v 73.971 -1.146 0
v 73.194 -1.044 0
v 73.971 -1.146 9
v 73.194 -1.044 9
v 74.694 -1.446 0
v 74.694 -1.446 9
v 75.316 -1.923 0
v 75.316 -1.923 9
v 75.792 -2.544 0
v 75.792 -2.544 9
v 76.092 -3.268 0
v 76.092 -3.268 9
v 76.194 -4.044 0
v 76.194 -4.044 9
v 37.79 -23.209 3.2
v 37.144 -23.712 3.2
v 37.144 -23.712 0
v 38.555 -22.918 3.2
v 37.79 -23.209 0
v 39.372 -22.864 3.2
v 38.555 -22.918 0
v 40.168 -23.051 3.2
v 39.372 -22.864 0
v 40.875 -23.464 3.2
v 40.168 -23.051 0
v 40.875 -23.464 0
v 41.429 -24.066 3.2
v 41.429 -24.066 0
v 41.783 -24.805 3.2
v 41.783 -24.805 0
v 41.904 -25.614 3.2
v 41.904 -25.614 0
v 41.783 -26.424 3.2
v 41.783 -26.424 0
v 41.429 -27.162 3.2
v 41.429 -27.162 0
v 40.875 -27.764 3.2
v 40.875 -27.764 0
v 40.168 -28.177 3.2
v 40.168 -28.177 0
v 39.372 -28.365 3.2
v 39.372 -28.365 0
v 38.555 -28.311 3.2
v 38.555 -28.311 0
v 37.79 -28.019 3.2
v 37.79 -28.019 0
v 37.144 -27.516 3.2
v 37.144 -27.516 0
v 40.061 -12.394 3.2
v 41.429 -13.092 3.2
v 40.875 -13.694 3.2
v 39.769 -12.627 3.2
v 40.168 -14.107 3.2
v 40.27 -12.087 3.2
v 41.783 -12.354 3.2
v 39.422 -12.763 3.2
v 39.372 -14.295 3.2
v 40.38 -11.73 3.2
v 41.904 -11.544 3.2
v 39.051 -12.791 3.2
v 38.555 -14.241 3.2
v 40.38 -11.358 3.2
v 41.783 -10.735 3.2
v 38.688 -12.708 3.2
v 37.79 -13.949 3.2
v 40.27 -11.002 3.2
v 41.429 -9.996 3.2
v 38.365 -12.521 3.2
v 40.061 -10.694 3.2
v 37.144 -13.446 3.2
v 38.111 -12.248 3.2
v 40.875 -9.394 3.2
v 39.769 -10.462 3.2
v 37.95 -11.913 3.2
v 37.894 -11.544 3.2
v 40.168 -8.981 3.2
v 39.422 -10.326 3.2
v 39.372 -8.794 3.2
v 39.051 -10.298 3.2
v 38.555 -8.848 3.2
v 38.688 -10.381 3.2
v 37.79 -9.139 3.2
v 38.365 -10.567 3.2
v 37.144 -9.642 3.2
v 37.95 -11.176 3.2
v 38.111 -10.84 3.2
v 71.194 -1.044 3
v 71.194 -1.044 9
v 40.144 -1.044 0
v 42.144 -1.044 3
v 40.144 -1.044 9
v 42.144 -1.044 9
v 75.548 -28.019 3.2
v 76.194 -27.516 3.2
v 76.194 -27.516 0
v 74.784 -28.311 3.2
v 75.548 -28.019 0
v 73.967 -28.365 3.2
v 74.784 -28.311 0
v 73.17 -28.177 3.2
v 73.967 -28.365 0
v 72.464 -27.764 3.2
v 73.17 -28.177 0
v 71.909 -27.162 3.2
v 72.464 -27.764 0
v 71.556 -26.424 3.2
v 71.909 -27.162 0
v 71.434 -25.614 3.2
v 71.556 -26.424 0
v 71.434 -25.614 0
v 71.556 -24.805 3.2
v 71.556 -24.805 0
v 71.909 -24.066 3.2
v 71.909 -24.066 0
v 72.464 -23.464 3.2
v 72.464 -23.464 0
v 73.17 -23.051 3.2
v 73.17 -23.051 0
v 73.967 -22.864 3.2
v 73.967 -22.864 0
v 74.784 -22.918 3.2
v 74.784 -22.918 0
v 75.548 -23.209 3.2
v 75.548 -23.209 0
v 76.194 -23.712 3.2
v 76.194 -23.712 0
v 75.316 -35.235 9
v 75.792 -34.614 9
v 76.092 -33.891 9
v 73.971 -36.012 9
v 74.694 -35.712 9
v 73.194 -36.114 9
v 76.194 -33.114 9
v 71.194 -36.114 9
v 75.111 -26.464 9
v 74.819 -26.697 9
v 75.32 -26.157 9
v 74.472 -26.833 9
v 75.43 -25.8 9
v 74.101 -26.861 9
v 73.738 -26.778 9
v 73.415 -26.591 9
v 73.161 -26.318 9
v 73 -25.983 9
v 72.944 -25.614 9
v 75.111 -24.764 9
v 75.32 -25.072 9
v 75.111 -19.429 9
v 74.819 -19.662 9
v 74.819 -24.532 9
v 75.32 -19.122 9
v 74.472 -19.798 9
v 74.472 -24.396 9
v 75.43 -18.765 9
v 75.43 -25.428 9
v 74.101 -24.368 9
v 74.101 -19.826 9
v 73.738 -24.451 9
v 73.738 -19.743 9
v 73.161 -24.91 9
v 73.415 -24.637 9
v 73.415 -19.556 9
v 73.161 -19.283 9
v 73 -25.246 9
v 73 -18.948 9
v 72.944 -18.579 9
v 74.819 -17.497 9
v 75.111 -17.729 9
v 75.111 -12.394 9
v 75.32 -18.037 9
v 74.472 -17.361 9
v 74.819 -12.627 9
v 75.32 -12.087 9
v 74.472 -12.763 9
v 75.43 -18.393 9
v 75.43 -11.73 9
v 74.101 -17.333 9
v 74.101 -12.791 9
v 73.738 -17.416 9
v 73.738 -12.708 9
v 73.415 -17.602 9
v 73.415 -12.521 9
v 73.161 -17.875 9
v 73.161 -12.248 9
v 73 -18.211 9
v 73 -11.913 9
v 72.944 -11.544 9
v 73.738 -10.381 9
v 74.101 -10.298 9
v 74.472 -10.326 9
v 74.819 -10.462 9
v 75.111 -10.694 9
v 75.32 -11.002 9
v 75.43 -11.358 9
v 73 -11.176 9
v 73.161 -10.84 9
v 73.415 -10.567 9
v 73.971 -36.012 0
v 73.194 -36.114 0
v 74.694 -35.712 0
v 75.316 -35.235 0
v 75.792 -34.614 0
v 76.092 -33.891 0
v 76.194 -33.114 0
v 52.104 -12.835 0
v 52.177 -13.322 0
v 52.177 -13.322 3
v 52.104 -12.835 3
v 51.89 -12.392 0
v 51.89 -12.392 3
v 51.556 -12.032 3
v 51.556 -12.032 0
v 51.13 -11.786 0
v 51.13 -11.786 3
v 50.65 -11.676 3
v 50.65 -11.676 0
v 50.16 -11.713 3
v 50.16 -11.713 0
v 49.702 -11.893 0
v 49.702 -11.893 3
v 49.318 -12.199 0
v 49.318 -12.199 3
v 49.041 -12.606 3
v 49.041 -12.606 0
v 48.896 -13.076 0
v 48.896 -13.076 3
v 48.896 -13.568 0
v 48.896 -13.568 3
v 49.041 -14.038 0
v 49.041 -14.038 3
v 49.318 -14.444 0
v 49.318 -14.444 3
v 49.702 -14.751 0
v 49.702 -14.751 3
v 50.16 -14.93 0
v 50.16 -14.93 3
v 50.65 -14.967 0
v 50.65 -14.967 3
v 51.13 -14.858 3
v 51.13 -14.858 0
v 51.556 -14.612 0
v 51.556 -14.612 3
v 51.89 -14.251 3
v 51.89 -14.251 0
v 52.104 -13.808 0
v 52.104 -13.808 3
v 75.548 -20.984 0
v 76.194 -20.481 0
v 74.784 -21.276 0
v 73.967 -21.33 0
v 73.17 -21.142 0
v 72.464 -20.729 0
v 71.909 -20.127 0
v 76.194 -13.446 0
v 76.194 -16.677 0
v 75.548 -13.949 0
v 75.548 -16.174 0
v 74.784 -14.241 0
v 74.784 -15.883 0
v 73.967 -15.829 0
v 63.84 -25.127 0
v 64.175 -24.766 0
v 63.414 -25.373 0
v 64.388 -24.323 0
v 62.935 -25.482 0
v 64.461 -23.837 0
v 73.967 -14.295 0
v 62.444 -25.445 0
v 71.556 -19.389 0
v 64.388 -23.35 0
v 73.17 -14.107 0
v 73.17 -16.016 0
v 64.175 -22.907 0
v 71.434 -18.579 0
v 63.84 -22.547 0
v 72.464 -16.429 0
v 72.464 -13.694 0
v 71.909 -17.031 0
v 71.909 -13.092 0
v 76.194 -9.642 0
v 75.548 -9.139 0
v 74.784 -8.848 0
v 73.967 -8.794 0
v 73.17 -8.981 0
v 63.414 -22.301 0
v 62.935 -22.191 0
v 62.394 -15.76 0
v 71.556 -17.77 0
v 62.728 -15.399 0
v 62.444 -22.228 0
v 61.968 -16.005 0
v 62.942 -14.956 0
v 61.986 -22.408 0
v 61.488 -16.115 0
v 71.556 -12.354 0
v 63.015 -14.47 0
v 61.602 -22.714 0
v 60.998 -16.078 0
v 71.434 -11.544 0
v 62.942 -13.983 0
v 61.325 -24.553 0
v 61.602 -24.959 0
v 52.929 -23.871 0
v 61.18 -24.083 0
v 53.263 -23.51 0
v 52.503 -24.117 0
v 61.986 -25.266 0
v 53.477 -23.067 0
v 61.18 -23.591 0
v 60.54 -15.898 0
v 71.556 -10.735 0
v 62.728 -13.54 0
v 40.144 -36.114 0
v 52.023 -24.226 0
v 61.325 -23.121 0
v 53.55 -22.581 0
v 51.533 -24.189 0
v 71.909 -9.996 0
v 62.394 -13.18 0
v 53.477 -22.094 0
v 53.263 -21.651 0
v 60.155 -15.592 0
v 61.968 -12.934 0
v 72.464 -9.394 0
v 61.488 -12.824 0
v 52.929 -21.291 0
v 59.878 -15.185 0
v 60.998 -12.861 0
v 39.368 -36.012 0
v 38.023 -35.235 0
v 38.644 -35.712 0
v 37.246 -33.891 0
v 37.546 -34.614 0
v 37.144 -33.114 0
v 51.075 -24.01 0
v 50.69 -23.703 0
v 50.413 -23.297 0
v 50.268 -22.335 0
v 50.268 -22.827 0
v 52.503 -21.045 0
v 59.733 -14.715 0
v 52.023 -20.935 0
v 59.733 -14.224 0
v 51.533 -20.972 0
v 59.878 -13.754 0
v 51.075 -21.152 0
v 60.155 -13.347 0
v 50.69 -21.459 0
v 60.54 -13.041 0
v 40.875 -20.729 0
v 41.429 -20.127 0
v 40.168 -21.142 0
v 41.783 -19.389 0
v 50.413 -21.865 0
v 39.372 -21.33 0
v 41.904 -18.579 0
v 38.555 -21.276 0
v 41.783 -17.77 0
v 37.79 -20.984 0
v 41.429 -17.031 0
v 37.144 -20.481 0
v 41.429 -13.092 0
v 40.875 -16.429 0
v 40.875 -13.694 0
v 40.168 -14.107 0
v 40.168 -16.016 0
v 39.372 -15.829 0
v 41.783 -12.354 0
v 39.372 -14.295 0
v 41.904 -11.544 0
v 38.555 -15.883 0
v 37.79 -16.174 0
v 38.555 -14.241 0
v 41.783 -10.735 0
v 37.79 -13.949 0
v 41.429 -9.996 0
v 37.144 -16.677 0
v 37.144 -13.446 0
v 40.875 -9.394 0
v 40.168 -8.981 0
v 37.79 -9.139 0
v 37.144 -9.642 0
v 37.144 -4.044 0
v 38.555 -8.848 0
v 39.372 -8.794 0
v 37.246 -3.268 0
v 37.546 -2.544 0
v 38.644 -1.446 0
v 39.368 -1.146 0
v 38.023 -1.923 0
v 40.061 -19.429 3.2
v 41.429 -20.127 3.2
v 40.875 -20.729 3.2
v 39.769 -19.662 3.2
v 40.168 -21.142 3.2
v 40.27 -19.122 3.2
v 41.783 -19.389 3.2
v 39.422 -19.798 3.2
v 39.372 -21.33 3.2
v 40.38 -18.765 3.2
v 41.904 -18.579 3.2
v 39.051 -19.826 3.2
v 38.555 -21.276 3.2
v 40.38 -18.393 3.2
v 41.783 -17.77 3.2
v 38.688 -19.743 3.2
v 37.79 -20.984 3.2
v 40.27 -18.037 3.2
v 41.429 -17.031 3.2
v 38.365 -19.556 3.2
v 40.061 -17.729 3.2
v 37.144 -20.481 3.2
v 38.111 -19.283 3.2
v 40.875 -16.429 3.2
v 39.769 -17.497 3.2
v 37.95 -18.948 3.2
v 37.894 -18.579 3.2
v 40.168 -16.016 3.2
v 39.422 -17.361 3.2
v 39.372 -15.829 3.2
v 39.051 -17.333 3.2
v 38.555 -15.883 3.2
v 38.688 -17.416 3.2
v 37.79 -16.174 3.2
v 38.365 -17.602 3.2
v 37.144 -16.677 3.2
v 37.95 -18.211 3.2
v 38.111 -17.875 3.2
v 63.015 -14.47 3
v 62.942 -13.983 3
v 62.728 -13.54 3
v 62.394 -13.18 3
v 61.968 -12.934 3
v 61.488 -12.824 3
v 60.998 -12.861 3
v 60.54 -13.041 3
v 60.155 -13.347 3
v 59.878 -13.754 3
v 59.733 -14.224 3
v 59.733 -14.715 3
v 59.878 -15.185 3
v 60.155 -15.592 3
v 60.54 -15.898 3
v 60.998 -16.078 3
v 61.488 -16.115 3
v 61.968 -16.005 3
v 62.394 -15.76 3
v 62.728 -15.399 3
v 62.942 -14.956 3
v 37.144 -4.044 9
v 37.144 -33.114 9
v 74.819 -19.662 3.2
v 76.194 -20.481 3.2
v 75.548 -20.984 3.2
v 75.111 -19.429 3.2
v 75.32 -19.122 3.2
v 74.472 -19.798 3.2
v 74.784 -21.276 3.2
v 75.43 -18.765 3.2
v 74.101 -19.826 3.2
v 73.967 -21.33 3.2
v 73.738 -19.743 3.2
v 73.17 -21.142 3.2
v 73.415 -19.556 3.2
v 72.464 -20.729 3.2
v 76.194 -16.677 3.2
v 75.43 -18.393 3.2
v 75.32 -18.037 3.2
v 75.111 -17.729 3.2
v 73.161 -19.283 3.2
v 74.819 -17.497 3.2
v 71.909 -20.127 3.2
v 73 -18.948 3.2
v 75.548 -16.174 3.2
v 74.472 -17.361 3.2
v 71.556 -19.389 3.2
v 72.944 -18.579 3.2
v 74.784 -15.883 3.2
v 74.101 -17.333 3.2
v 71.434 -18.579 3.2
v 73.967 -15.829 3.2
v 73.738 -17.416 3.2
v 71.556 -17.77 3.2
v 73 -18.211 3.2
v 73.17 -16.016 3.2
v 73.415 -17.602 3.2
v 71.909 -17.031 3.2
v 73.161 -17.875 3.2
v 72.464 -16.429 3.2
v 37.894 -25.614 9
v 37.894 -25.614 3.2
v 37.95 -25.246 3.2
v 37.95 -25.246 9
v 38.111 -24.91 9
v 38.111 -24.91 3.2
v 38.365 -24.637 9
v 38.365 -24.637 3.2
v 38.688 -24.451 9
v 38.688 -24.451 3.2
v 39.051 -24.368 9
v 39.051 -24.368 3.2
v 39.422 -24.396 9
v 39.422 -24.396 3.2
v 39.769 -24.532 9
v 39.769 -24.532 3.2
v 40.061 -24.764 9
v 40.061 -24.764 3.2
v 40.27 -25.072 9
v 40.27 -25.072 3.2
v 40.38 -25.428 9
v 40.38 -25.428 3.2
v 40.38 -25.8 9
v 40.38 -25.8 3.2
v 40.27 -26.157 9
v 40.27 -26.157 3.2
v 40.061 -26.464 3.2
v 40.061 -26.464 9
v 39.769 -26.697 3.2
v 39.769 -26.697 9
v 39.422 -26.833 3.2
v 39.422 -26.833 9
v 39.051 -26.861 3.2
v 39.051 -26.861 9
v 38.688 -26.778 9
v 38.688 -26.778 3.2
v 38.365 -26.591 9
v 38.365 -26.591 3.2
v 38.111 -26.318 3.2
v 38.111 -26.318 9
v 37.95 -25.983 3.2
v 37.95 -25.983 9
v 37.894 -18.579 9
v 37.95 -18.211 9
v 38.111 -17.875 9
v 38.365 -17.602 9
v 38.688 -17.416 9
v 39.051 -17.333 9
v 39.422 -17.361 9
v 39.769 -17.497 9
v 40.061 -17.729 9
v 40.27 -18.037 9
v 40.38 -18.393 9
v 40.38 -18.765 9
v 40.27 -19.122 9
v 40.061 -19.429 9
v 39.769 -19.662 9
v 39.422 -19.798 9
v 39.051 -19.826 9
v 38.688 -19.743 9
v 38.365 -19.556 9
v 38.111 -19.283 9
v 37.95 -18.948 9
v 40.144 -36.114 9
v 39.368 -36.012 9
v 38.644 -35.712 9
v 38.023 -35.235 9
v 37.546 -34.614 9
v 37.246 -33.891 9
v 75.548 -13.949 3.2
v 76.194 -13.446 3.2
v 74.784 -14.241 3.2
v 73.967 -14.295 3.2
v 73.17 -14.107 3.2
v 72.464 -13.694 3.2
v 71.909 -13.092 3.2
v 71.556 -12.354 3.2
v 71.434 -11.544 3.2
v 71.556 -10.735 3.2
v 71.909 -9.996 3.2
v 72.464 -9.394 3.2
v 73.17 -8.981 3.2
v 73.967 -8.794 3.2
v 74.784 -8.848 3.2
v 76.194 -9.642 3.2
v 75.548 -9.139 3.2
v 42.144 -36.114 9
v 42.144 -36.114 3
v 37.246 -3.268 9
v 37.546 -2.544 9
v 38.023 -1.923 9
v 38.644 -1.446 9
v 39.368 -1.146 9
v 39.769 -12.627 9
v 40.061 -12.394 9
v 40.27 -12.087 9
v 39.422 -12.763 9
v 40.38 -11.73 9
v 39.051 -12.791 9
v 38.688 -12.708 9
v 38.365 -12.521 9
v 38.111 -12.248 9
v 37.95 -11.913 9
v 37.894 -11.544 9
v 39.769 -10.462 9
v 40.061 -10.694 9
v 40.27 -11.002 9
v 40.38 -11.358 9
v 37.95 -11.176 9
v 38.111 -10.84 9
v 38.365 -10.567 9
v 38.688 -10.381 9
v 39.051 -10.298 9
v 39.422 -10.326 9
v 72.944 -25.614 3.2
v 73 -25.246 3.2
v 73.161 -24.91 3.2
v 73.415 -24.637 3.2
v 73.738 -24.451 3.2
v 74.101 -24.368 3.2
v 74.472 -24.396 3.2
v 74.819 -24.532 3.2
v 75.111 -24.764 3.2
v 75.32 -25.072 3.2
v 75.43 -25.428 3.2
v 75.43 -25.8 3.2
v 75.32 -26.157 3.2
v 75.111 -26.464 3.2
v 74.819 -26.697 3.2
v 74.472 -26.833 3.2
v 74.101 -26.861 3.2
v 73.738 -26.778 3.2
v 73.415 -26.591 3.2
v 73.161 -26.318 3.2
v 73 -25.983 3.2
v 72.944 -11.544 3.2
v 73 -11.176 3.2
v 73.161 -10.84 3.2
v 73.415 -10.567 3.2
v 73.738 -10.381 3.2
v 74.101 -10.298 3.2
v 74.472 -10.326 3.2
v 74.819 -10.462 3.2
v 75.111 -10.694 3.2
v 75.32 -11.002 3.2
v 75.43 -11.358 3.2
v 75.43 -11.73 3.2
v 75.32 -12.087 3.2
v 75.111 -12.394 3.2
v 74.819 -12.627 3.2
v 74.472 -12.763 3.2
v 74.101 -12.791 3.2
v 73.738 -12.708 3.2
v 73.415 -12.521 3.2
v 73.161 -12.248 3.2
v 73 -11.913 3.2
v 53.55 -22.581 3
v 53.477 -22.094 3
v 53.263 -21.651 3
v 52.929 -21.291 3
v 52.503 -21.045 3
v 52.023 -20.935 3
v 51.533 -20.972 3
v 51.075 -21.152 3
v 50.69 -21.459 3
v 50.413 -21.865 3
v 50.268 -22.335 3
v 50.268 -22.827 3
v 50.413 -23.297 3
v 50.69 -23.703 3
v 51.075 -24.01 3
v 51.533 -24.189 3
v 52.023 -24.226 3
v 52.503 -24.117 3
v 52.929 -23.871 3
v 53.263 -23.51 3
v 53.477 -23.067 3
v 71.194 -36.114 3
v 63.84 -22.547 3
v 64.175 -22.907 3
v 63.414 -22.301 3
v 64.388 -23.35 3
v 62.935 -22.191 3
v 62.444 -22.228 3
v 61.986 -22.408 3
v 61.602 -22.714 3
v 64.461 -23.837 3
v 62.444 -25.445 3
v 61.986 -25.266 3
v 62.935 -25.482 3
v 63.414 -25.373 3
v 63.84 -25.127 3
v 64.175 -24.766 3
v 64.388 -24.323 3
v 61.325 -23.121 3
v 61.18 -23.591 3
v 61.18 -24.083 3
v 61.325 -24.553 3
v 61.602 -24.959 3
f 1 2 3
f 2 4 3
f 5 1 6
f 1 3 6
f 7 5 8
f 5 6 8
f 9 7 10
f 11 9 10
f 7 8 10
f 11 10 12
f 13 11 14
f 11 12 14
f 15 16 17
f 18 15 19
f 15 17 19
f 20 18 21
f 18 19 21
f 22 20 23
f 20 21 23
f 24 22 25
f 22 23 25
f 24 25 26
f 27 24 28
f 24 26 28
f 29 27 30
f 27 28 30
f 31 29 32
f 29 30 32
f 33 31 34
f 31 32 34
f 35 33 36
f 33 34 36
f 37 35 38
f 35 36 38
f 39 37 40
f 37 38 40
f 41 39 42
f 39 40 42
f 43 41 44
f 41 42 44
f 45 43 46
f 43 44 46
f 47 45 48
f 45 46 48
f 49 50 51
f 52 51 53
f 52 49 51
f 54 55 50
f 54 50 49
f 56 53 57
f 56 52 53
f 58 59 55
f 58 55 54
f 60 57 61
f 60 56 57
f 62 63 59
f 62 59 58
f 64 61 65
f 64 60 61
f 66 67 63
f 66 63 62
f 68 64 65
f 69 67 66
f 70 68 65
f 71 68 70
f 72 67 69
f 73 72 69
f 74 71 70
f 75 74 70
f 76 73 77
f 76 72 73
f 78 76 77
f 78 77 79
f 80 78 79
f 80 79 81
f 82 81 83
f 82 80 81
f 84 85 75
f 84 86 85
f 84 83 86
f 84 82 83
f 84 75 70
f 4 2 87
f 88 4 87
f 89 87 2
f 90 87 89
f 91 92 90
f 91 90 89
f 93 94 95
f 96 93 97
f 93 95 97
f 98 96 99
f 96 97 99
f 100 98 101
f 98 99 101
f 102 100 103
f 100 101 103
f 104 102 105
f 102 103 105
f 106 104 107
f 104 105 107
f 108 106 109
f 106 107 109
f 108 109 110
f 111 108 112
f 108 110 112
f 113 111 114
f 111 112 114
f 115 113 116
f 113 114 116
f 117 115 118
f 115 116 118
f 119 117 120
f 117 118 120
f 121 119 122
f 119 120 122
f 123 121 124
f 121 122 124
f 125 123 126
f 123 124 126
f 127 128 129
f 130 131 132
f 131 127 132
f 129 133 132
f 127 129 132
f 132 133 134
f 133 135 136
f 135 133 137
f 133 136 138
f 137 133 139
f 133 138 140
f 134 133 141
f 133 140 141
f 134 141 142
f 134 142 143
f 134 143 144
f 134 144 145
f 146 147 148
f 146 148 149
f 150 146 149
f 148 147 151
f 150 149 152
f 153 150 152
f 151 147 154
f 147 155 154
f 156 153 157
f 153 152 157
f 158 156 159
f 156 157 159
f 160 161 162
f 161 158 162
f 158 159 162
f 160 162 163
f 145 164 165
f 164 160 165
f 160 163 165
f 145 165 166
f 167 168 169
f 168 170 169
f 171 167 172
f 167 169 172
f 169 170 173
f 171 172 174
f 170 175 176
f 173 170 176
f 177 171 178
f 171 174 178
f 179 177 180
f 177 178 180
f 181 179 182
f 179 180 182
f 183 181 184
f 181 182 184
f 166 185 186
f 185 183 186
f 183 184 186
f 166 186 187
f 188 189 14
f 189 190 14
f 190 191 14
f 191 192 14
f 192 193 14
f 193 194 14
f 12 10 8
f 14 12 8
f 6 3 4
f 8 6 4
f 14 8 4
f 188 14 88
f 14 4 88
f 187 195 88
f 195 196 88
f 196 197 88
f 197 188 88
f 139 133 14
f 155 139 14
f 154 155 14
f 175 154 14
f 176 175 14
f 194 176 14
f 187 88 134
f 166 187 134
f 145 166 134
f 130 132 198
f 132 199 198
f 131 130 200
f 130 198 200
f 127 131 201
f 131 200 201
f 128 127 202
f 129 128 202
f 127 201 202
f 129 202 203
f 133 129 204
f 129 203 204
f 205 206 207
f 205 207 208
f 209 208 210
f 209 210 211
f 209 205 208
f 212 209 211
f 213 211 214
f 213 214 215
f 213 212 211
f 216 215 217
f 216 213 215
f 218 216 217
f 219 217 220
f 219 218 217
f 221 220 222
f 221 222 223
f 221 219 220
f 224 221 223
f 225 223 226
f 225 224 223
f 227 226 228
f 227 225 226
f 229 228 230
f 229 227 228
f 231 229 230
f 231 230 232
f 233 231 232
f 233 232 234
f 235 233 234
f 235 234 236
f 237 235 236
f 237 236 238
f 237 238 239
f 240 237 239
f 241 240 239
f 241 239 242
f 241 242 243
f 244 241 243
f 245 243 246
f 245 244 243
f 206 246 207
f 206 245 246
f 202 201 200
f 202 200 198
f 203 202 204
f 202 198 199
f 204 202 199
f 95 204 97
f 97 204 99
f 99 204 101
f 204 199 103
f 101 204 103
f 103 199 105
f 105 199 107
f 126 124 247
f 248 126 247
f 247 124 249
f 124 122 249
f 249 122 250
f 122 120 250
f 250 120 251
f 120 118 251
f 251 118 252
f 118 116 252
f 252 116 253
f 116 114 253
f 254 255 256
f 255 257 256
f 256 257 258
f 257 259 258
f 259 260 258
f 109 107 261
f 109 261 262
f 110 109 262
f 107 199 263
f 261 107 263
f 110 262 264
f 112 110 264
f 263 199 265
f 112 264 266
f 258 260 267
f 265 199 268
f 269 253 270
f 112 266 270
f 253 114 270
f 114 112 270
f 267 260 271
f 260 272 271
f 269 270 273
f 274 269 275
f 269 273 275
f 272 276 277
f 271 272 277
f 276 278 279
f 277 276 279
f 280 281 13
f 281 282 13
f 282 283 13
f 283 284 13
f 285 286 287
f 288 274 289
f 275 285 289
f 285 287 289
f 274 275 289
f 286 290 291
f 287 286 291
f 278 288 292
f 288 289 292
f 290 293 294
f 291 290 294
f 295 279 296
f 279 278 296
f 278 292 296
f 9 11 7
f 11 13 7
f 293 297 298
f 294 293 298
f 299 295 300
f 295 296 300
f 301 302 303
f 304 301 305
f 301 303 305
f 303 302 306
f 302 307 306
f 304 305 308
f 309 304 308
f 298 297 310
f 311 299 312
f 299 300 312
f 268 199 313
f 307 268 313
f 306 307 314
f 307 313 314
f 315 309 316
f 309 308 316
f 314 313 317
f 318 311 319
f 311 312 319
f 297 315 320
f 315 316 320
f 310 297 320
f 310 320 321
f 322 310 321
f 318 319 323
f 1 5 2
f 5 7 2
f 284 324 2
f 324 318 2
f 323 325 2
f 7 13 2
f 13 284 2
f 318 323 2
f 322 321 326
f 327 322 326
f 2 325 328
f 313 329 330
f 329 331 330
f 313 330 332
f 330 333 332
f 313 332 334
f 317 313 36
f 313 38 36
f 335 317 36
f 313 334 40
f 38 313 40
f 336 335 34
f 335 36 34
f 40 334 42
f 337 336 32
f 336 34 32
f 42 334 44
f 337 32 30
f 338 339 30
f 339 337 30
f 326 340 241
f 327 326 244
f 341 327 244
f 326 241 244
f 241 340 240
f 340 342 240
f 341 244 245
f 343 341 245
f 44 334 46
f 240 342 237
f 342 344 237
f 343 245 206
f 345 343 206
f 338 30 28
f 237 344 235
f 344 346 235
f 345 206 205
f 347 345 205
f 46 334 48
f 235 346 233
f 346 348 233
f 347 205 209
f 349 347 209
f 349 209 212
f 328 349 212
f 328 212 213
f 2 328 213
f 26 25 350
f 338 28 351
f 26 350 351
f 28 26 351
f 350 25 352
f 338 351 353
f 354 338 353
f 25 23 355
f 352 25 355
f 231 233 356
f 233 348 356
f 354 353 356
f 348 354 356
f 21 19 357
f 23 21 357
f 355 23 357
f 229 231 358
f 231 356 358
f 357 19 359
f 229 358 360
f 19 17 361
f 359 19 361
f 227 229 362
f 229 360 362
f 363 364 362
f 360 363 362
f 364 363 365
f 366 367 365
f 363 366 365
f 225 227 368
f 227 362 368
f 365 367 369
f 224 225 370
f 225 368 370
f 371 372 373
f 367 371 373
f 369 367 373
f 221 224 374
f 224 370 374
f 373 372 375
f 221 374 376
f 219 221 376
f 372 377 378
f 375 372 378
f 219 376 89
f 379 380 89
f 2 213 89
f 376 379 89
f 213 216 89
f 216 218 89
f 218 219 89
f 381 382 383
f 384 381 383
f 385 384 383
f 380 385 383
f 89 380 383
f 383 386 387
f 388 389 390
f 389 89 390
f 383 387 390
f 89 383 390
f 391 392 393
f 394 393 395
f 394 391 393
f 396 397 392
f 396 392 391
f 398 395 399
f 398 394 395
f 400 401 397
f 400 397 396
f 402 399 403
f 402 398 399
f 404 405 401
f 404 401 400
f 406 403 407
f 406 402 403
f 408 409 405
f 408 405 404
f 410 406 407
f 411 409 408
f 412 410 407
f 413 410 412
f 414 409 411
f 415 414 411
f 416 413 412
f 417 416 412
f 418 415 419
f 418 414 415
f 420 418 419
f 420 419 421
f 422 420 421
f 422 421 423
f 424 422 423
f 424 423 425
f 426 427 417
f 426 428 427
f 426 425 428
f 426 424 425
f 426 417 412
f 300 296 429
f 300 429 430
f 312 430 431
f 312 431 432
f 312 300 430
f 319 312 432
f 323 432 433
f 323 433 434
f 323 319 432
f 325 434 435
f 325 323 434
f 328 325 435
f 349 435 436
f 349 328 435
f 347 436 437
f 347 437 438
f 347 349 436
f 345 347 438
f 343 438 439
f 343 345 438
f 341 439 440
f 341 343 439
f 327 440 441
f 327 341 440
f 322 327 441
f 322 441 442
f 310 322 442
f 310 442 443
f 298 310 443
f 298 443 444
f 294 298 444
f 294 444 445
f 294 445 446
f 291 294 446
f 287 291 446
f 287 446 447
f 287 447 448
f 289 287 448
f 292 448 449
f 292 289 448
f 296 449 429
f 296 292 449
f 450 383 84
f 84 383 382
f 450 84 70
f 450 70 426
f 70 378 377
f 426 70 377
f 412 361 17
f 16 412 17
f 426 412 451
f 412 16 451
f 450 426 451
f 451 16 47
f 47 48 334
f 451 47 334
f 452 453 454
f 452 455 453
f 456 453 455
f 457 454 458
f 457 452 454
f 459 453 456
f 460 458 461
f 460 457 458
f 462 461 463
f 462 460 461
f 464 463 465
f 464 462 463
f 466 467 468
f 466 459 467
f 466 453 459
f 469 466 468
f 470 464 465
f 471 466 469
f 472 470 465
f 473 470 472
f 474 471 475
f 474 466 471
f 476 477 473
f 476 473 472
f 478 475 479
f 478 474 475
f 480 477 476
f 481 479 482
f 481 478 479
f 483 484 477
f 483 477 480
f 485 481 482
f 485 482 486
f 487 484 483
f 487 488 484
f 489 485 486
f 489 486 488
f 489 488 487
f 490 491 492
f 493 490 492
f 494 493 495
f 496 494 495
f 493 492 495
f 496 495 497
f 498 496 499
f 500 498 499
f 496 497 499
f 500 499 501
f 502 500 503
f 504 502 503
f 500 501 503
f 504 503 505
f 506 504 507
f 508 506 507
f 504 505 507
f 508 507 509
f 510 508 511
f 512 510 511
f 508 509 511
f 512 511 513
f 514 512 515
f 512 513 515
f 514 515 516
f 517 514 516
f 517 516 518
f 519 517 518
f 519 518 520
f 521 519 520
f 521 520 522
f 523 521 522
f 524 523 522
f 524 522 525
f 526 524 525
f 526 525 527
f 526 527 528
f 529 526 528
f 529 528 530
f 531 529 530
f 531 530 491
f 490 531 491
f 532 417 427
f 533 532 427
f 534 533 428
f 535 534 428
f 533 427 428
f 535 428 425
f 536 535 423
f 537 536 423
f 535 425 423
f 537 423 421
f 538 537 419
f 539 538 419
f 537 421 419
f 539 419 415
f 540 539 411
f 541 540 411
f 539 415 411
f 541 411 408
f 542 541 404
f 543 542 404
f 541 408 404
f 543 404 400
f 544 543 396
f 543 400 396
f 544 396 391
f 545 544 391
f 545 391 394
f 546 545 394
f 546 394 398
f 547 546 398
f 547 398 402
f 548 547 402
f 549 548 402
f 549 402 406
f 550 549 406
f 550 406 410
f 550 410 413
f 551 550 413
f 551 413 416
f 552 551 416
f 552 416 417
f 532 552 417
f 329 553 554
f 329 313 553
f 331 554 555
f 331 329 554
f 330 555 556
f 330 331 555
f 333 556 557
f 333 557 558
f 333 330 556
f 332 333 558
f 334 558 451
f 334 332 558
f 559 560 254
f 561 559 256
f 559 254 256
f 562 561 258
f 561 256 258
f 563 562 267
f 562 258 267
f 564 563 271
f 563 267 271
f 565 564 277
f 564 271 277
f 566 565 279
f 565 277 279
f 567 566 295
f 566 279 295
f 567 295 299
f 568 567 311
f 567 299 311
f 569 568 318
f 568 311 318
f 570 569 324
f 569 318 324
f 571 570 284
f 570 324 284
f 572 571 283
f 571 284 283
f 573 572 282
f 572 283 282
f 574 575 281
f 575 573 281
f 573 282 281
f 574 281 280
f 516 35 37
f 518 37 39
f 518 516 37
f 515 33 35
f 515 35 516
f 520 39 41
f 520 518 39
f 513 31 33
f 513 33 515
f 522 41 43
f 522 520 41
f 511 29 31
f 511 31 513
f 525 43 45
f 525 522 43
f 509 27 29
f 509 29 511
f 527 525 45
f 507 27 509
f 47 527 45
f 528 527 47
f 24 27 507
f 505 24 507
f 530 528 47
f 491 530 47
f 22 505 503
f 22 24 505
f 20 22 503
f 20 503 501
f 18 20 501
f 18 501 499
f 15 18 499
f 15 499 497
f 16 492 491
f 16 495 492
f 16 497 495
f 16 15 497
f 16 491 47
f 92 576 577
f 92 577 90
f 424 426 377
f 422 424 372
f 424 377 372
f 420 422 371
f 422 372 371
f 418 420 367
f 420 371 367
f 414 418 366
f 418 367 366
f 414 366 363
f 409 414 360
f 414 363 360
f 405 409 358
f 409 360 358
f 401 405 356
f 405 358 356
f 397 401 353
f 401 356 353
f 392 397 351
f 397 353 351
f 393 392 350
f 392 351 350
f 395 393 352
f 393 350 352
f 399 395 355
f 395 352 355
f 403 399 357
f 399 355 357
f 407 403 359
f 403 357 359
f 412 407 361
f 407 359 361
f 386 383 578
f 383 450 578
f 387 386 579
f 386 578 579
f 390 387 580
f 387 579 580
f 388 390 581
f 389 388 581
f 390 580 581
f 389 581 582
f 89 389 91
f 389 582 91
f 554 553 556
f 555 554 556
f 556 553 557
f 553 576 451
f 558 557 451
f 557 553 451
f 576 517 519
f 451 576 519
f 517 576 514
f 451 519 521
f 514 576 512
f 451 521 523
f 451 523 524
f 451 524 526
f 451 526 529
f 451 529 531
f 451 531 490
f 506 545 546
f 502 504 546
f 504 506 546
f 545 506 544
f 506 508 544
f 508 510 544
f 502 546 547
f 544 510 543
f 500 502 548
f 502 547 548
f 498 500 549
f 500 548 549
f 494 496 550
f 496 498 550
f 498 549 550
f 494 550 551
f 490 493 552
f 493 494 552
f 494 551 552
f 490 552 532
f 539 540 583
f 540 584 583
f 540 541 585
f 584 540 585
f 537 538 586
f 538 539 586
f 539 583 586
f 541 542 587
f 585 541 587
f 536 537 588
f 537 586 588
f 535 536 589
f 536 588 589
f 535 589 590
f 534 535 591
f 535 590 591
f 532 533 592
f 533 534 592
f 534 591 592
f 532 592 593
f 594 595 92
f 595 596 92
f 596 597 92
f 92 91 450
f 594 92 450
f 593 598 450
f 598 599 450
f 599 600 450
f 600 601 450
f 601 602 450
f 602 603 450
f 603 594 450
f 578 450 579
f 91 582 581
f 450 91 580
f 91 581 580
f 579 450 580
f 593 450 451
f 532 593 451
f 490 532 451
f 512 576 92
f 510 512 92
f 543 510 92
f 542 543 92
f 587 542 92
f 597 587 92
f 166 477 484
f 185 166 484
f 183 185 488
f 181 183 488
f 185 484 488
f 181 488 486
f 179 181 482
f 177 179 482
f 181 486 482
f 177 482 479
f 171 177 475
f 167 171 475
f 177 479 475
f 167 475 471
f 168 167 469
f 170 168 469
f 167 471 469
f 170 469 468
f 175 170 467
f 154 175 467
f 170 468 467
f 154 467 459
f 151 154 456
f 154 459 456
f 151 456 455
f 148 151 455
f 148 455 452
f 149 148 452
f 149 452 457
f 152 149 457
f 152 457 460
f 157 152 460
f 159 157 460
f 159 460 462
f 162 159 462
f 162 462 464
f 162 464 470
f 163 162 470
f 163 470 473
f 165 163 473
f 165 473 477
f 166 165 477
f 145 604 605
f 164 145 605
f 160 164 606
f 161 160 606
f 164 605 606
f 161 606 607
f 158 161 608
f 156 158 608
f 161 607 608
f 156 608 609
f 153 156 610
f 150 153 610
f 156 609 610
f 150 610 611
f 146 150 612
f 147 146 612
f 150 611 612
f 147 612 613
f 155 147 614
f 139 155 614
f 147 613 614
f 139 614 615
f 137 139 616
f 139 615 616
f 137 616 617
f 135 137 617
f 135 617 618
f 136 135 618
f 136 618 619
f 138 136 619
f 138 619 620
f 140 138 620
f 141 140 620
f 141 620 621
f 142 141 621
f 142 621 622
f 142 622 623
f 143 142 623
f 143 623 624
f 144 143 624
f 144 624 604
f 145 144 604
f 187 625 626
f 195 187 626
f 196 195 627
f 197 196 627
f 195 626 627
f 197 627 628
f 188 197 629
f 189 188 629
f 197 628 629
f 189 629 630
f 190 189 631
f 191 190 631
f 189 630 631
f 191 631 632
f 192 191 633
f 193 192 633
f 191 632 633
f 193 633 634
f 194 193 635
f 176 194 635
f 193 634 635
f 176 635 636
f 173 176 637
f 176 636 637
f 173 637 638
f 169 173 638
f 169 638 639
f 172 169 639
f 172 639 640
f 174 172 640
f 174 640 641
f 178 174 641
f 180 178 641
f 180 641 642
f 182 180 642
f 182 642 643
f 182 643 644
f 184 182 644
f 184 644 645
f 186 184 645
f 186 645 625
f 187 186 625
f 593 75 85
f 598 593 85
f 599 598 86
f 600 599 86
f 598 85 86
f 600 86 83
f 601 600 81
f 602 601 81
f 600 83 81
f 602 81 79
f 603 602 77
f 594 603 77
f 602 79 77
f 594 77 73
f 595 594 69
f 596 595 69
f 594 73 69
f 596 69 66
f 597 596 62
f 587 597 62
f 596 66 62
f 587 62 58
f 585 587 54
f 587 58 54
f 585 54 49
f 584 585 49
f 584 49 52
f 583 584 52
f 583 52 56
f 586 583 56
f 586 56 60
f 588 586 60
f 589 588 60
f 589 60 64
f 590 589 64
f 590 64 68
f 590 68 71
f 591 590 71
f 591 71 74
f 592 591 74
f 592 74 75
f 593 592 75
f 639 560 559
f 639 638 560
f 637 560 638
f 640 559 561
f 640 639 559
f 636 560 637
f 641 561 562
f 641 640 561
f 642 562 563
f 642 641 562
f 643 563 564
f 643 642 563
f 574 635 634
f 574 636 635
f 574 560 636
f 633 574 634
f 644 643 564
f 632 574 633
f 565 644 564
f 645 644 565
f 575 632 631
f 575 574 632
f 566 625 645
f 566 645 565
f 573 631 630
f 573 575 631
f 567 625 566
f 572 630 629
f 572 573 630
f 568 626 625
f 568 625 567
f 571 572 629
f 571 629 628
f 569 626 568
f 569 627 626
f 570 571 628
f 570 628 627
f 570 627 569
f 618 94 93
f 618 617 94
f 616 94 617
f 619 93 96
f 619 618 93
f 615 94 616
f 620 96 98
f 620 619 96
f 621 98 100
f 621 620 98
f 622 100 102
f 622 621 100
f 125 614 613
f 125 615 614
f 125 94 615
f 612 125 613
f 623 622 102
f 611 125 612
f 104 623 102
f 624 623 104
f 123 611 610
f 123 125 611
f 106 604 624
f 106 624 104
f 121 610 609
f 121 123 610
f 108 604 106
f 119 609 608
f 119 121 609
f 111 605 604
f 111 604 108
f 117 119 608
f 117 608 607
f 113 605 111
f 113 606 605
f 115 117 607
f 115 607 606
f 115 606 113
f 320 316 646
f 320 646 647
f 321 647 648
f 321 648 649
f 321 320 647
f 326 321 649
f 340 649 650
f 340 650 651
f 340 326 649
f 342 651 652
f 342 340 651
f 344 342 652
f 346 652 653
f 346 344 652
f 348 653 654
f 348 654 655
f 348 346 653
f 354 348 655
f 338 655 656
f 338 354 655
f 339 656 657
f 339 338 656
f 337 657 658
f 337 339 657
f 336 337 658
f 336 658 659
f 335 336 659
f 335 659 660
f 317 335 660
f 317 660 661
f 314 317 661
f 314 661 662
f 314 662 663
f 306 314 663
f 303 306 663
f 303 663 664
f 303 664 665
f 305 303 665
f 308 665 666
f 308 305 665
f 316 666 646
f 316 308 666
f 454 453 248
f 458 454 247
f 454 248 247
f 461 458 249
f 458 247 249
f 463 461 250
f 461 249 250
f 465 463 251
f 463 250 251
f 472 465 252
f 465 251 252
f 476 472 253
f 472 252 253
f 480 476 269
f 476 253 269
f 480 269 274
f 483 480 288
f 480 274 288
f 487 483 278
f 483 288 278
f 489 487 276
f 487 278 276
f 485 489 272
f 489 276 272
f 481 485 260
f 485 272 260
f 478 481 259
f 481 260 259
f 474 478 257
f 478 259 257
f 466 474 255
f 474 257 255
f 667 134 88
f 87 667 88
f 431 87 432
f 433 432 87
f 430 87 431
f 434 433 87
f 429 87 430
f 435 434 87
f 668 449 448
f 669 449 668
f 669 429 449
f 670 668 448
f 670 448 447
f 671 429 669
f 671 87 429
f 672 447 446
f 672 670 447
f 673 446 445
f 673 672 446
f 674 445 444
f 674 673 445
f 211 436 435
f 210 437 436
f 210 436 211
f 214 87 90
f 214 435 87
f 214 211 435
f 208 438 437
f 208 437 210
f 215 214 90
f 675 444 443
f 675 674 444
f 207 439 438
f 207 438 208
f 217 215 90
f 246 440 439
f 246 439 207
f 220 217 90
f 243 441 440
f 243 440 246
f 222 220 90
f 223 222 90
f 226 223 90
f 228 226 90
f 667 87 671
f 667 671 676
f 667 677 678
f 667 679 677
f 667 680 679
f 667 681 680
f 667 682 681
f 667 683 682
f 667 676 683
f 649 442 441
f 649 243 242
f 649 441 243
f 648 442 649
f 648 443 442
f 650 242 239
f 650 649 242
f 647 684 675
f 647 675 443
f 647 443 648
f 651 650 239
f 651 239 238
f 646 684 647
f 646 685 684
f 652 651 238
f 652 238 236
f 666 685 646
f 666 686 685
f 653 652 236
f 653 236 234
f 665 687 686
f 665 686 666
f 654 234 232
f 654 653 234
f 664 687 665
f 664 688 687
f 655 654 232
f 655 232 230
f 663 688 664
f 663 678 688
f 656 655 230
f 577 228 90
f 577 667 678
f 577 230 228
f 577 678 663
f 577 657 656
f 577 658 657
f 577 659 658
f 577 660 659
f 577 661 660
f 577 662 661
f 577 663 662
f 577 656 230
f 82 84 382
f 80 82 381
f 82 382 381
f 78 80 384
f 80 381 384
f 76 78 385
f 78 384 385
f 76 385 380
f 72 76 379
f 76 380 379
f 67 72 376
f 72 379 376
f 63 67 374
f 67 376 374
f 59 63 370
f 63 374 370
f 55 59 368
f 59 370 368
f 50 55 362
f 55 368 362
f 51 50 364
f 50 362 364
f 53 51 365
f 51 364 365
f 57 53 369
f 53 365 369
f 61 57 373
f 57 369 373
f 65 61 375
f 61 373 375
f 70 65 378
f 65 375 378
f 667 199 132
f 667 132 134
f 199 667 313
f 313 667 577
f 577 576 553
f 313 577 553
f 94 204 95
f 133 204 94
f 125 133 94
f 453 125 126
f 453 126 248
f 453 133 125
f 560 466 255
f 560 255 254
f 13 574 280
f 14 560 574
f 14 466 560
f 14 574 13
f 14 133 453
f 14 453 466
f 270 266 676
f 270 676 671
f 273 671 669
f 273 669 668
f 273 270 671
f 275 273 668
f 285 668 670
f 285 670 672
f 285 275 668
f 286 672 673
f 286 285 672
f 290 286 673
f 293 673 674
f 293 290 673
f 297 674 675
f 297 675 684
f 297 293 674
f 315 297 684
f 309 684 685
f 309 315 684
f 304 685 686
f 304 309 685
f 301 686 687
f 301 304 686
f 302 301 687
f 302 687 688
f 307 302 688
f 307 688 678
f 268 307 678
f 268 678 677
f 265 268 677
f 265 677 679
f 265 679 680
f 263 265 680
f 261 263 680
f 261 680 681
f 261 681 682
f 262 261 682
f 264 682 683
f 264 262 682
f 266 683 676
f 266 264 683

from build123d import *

# Parameters (mm, degrees)
SKETCH_1_W               = 39.05
SKETCH_1_H               = 35.07
SKETCH_1_R               = 1.65
SKETCH_1_R_2             = 1.25
EXTRUDE_1_DEPTH          = 3
EXTRUDE_2_DEPTH          = 1
EXTRUDE_2_DEPTH_BACK     = 9
SKETCH_2_W               = 5
SKETCH_2_H               = 35.07
CUT_EXTRUDE_3_DEPTH      = 41
CUT_EXTRUDE_3_DEPTH_BACK = 10
SKETCH_6_W               = 1
SKETCH_6_H               = 35.07
SKETCH_7_R               = 1.25
CUT_EXTRUDE_4_DEPTH      = 27
FILLET_6_R               = 3
FILLET_7_R               = 3
FILLET_8_R               = 3
SKETCH_13_R              = 2.76
CUT_EXTRUDE_7_DEPTH      = 3.2


with BuildPart() as part:
    # 草图1 → 凸台-拉伸1 (new body)
    with BuildSketch(Plane(origin=(0, 0, 0), x_dir=(-1, 0, 0), z_dir=(0, 0, 1))):
        with Locations((-56.669266884, 18.579160576)):
            Rectangle(SKETCH_1_W, SKETCH_1_H)
        with Locations(Location((-62.811349691, 23.836728616, 0), (0, 0, 180))):
            Circle(SKETCH_1_R, mode=Mode.SUBTRACT)
        with Locations(Location((-50.527184077, 13.321592536, 0), (0, 0, 180))):
            Circle(SKETCH_1_R, mode=Mode.SUBTRACT)
        with Locations(Location((-74.194266884, 25.614160576, 0), (0, 0, 180))):
            Circle(SKETCH_1_R_2, mode=Mode.SUBTRACT)
        with Locations(Location((-74.194266884, 11.544160576, 0), (0, 0, 180))):
            Circle(SKETCH_1_R_2, mode=Mode.SUBTRACT)
        with Locations(Location((-74.194266884, 18.579160576, 0), (0, 0, 180))):
            Circle(SKETCH_1_R_2, mode=Mode.SUBTRACT)
        with Locations(Location((-39.144266884, 25.614160576, 0), (0, 0, 180))):
            Circle(SKETCH_1_R_2, mode=Mode.SUBTRACT)
        with Locations(Location((-39.144266884, 18.579160576, 0), (0, 0, 180))):
            Circle(SKETCH_1_R_2, mode=Mode.SUBTRACT)
        with Locations(Location((-39.144266884, 11.544160576, 0), (0, 0, 180))):
            Circle(SKETCH_1_R_2, mode=Mode.SUBTRACT)
        with Locations(Location((-51.900012913, 22.58082967, 0), (0, 0, 180))):
            Circle(SKETCH_1_R, mode=Mode.SUBTRACT)
        with Locations(Location((-61.364857237, 14.469544513, 0), (0, 0, 180))):
            Circle(SKETCH_1_R, mode=Mode.SUBTRACT)
    extrude(amount=EXTRUDE_1_DEPTH)

    # 草图2 → 凸台-拉伸2 (add, two sides: drawn at the far end of the back side and taken through both)
    with BuildSketch(Plane(origin=(0, 0, 0), x_dir=(-1, 0, 0), z_dir=(0, 0, -1)).offset(-EXTRUDE_2_DEPTH_BACK)):
        with Locations((-73.694266884, -18.579160576)):
            Rectangle(SKETCH_2_W, SKETCH_2_H)
        with Locations((-39.644266884, -18.579160576)):
            Rectangle(SKETCH_2_W, SKETCH_2_H)
    extrude(amount=EXTRUDE_2_DEPTH + EXTRUDE_2_DEPTH_BACK)

    # 草图6 → 切除-拉伸3 (cut, two sides: drawn at the far end of the back side and taken through both)
    with BuildSketch(Plane(origin=(42.144266884, 0, 0), x_dir=(0, 0, -1), z_dir=(1, 0, 0)).offset(-CUT_EXTRUDE_3_DEPTH_BACK)):
        with Locations((0.5, -18.579160576)):
            Rectangle(SKETCH_6_W, SKETCH_6_H)
    extrude(amount=CUT_EXTRUDE_3_DEPTH + CUT_EXTRUDE_3_DEPTH_BACK, mode=Mode.SUBTRACT)

    # 草图7 → 切除-拉伸4 (cut)
    with BuildSketch(Plane(origin=(0, 0, 0), x_dir=(-1, 0, 0), z_dir=(0, 0, -1))):
        with Locations((-74.194266884, -11.544160576)):
            Circle(SKETCH_7_R)
        with Locations((-74.194266884, -18.579160576)):
            Circle(SKETCH_7_R)
        with Locations((-74.194266884, -25.614160576)):
            Circle(SKETCH_7_R)
        with Locations((-39.144266884, -11.544160576)):
            Circle(SKETCH_7_R)
        with Locations((-39.144266884, -18.579160576)):
            Circle(SKETCH_7_R)
        with Locations((-39.144266884, -25.614160576)):
            Circle(SKETCH_7_R)
    extrude(amount=-CUT_EXTRUDE_4_DEPTH, mode=Mode.SUBTRACT)

    # 圆角6
    fillet_6_edges = [part.edges().sort_by_distance(p)[0] for p in [
        (37.144266884, -36.114160576, 4.5),
    ]]
    fillet(fillet_6_edges, radius=FILLET_6_R)

    # 圆角7
    fillet_7_edges = [part.edges().sort_by_distance(p)[0] for p in [
        (37.144266884, -1.044160576, 4.5),
    ]]
    fillet(fillet_7_edges, radius=FILLET_7_R)

    # 圆角8
    fillet_8_edges = [part.edges().sort_by_distance(p)[0] for p in [
        (76.194266884, -1.044160576, 4.5),
        (76.194266884, -36.114160576, 4.5),
    ]]
    fillet(fillet_8_edges, radius=FILLET_8_R)

    # 草图13 → 切除-拉伸7 (cut)
    with BuildSketch(Plane(origin=(0, 0, 0), x_dir=(-1, 0, 0), z_dir=(0, 0, -1))):
        with Locations((-74.194266884, -11.544160576)):
            Circle(SKETCH_13_R)
        with Locations((-74.194266884, -18.579160576)):
            Circle(SKETCH_13_R)
        with Locations((-74.194266884, -25.614160576)):
            Circle(SKETCH_13_R)
        with Locations((-39.144266884, -11.544160576)):
            Circle(SKETCH_13_R)
        with Locations((-39.144266884, -18.579160576)):
            Circle(SKETCH_13_R)
        with Locations((-39.144266884, -25.614160576)):
            Circle(SKETCH_13_R)
    extrude(amount=-CUT_EXTRUDE_7_DEPTH, mode=Mode.SUBTRACT)


solid = part.part
